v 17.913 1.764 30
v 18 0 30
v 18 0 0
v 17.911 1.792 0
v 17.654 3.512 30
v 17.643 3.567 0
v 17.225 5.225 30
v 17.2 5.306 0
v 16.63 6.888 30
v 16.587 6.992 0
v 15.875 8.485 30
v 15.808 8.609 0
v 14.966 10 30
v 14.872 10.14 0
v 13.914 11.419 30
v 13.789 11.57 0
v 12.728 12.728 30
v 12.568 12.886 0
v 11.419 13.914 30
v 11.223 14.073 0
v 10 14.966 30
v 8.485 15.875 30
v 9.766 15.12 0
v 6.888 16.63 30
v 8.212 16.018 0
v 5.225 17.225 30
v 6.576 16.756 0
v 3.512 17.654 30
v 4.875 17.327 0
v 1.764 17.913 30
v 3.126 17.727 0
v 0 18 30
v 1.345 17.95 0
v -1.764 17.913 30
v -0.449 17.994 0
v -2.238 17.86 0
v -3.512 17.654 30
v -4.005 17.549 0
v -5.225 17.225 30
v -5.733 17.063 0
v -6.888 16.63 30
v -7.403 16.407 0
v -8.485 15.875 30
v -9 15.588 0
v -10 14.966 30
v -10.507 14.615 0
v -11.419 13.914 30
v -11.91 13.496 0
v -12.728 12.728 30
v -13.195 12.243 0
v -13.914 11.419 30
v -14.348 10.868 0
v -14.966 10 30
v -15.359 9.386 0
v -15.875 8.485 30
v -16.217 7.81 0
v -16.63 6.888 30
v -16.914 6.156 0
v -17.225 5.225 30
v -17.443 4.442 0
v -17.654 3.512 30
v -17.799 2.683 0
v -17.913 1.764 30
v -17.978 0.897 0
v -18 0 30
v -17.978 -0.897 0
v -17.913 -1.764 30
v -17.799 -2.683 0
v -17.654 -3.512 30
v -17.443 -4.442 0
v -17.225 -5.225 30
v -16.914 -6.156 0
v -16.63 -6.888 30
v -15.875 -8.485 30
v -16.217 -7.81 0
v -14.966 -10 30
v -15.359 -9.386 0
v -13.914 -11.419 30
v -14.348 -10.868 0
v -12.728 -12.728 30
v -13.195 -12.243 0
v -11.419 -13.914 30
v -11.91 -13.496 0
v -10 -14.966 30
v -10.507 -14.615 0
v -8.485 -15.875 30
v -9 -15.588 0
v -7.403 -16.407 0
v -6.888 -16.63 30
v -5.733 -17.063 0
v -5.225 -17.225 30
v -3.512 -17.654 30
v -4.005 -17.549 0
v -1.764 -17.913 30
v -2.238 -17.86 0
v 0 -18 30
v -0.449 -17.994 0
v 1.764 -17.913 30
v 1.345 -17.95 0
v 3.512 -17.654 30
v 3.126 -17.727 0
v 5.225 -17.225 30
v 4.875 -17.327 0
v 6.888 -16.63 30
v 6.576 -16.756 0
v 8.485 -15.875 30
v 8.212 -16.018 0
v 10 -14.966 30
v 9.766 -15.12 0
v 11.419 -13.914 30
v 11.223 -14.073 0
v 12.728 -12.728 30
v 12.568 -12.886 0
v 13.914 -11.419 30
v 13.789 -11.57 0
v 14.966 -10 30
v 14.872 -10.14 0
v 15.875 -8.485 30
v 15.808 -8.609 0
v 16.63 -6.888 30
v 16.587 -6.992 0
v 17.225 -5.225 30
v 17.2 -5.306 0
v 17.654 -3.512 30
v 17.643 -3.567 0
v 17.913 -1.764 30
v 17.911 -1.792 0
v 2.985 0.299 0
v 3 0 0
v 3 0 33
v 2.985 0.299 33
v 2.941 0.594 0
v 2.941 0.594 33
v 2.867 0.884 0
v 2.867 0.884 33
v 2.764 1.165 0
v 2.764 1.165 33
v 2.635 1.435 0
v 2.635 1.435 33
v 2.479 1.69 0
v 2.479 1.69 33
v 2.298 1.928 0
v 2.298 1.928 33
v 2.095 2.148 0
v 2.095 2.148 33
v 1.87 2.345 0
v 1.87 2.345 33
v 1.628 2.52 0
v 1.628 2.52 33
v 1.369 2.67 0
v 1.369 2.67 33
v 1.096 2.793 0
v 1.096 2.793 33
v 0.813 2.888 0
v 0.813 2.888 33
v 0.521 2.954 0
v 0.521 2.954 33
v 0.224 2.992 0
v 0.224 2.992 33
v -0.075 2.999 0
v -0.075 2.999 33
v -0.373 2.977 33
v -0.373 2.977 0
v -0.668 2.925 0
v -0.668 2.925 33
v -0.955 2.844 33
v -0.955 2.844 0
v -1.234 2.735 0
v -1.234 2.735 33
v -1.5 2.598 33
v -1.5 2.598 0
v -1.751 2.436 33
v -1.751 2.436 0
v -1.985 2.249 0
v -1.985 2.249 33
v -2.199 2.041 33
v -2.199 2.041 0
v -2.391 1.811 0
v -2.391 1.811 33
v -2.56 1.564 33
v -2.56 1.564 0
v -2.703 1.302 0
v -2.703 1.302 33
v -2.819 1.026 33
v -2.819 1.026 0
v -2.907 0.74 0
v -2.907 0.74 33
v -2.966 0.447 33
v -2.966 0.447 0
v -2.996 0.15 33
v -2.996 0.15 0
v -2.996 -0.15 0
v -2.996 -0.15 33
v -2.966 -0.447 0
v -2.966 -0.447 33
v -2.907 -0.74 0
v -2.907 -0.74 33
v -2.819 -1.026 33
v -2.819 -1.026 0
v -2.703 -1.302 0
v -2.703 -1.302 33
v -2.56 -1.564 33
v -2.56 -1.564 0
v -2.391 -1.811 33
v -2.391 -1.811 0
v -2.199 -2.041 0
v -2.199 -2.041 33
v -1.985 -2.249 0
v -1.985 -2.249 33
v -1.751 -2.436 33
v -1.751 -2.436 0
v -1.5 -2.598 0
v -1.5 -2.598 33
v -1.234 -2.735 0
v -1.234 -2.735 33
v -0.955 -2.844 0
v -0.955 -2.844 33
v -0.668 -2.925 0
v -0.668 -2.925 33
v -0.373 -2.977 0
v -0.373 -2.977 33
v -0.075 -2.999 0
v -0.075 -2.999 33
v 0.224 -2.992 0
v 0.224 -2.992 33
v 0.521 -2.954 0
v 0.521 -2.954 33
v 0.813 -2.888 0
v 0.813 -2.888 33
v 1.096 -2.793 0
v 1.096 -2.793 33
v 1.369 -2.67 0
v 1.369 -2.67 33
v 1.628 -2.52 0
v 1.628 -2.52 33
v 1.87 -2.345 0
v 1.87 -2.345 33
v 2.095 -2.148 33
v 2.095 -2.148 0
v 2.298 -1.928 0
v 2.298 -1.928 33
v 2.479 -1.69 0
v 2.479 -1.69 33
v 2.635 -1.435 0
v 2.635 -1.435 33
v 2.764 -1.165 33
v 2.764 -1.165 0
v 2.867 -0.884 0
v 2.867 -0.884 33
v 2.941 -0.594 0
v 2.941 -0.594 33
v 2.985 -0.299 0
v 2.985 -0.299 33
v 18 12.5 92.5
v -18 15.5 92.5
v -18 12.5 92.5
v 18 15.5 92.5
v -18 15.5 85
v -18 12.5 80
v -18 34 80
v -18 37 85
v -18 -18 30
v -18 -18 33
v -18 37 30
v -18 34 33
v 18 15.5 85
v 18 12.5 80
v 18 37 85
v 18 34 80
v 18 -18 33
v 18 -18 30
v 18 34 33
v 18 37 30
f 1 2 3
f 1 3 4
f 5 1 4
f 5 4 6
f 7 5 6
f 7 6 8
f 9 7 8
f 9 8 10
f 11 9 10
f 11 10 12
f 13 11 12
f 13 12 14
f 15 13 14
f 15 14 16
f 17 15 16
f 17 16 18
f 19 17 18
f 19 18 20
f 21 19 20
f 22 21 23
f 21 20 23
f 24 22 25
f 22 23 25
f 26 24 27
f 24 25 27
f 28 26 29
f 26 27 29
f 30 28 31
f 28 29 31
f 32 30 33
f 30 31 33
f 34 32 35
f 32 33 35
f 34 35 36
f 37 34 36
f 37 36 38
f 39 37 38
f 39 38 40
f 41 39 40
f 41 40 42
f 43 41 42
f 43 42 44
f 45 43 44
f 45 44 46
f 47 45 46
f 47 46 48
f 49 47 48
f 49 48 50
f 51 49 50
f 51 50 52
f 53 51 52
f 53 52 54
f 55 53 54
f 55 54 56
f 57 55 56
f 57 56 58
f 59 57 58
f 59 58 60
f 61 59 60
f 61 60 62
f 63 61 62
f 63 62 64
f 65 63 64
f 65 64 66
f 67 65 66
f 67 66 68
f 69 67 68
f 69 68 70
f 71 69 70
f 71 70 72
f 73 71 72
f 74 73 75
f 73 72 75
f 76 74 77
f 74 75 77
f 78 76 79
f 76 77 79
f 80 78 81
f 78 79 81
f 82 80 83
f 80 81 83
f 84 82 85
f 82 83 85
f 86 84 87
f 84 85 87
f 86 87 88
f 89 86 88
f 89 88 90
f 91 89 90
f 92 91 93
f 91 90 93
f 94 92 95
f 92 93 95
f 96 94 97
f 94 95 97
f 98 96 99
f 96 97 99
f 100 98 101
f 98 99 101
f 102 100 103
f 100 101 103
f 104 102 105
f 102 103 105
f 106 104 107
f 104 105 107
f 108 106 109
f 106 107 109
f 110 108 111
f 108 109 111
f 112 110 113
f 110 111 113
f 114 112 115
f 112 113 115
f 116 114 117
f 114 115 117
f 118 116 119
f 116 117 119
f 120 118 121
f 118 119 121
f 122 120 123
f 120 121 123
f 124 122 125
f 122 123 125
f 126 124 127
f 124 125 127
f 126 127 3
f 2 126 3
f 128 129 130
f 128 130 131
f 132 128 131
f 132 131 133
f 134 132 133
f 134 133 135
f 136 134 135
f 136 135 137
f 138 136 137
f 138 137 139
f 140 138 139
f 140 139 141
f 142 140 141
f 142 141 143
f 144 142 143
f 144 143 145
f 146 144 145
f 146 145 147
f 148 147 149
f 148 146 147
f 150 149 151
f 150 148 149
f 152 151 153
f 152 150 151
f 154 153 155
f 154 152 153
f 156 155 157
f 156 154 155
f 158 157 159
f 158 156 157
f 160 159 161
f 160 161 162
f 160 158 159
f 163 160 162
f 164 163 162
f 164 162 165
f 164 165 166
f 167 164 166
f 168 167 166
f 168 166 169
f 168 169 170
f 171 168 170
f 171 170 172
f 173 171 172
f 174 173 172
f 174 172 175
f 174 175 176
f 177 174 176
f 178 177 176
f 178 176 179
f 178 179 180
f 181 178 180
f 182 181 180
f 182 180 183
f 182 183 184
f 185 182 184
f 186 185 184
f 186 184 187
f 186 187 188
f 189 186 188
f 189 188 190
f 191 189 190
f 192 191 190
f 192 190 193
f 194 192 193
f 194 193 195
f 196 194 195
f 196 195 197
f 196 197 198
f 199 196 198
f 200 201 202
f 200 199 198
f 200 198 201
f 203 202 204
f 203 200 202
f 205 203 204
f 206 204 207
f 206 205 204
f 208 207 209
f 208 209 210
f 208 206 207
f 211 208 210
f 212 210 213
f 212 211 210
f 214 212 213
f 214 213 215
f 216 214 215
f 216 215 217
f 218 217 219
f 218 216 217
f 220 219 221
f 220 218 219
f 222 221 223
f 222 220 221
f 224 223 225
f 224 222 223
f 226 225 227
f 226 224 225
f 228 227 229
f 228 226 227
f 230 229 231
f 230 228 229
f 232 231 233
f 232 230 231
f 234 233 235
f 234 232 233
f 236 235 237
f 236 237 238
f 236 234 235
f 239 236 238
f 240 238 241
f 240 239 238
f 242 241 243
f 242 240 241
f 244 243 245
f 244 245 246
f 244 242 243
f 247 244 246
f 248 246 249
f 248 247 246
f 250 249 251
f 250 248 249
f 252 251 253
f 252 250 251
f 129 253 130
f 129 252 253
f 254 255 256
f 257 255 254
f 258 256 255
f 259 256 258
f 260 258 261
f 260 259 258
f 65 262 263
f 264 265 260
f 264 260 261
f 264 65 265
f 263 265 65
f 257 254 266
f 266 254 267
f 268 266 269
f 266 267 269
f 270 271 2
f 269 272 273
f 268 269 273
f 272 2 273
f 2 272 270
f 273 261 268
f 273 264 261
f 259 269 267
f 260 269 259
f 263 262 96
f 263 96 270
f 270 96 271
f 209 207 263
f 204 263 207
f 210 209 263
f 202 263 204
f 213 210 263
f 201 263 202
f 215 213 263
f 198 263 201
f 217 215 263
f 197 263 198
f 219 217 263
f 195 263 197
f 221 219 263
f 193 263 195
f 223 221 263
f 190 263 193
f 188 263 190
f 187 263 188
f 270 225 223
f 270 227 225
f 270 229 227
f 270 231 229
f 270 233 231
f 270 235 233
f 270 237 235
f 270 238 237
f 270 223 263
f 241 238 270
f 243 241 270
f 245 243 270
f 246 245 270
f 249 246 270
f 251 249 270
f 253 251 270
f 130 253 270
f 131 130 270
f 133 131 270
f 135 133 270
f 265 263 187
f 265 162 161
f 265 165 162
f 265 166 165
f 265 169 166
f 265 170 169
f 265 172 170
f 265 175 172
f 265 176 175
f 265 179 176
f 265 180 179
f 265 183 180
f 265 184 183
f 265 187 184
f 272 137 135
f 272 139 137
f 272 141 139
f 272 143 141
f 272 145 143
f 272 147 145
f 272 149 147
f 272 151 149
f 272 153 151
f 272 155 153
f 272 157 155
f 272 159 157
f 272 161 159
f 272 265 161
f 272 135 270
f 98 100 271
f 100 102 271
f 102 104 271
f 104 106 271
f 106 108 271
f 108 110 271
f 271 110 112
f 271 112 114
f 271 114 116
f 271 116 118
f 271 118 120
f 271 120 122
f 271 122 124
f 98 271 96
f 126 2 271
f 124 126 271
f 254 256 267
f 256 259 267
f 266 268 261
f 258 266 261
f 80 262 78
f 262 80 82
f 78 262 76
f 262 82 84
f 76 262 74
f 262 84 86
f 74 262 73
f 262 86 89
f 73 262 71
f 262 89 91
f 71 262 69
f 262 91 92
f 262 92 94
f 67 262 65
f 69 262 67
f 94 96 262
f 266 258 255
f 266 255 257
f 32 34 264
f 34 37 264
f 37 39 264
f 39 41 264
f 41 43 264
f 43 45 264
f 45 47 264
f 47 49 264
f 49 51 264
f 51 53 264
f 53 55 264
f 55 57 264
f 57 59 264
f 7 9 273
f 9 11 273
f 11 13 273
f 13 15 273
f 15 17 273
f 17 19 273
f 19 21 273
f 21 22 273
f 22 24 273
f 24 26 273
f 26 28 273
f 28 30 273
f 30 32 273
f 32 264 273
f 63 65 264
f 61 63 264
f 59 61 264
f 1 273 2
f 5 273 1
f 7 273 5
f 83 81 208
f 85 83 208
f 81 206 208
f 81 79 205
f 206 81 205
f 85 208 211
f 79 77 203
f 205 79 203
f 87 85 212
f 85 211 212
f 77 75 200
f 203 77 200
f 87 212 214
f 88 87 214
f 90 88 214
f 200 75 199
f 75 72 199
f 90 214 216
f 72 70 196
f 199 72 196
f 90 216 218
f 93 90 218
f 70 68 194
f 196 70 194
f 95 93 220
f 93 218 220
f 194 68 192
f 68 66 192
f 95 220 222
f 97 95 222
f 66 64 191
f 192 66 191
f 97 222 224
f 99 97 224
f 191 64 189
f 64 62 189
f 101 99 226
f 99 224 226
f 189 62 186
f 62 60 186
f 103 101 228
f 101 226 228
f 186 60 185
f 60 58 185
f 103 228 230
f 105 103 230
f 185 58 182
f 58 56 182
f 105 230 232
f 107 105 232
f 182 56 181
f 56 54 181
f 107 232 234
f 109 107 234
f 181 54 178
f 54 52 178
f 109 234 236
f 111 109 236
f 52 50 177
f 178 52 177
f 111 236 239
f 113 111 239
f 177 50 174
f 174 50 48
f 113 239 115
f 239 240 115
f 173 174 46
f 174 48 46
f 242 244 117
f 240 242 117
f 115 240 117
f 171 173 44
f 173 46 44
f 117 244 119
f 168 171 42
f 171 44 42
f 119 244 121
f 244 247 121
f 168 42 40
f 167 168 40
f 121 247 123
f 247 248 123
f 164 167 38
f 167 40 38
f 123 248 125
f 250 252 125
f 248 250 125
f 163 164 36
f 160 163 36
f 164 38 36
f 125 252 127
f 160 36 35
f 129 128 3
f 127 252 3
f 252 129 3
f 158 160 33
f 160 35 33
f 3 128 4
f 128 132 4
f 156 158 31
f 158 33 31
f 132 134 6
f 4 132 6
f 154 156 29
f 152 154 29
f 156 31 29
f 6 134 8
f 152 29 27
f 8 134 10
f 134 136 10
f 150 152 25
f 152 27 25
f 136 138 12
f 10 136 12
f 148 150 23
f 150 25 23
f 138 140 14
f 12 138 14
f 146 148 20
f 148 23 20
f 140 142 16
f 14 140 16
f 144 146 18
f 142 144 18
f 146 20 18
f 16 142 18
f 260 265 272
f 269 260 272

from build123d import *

# Parameters (mm, degrees)
SKETCH2_R               = 18
BOSS_EXTRUDE1_DEPTH     = 30
SKETCH4_W               = 36
SKETCH4_H               = 55
BOSS_EXTRUDE2_DEPTH     = 3
CUT_EXTRUDE1_DEPTH      = 3
CUT_EXTRUDE1_DEPTH_BACK = 60
SKETCH3_R               = 3
SKETCH6_W               = 36
SKETCH6_H               = 47
BOSS_EXTRUDE3_DEPTH     = 3
BOSS_EXTRUDE4_DEPTH     = 5
SKETCH8_W               = 36
SKETCH8_H               = 3
BOSS_EXTRUDE5_DEPTH     = 7.5


with BuildPart() as part:
    # Sketch2 → Boss-Extrude1 (new body)
    with BuildSketch(Plane.XY):
        Circle(SKETCH2_R)
    extrude(amount=BOSS_EXTRUDE1_DEPTH)

    # Sketch4 → Boss-Extrude2 (add)
    with BuildSketch(Plane.XY.offset(30)):
        with Locations((0, 9.5)):
            Rectangle(SKETCH4_W, SKETCH4_H)
    extrude(amount=BOSS_EXTRUDE2_DEPTH)

    # Sketch3 → Cut-Extrude1 (cut, two sides: drawn at the far end of the back side and taken through both)
    with BuildSketch(Plane.XY.offset(30).offset(-CUT_EXTRUDE1_DEPTH_BACK)):
        Circle(SKETCH3_R)
    extrude(amount=CUT_EXTRUDE1_DEPTH + CUT_EXTRUDE1_DEPTH_BACK, mode=Mode.SUBTRACT)

    # Sketch6 → Boss-Extrude3 (add)
    with BuildSketch(Plane(origin=(0, 37, 0), x_dir=(1, 0, 0), z_dir=(0, 1, 0))):
        with Locations((0, -56.5)):
            Rectangle(SKETCH6_W, SKETCH6_H)
    extrude(amount=-BOSS_EXTRUDE3_DEPTH)

    # Sketch7 → Boss-Extrude4 (add)
    with BuildSketch(Plane.XY.offset(80)):
        Polygon((18, 34), (18, 12.5), (-18, 12.5), (-18, 34), (-18, 37), (18, 37), align=None)
    extrude(amount=BOSS_EXTRUDE4_DEPTH)

    # Sketch8 → Boss-Extrude5 (add)
    with BuildSketch(Plane.XY.offset(85)):
        with Locations((0, 14)):
            Rectangle(SKETCH8_W, SKETCH8_H)
    extrude(amount=BOSS_EXTRUDE5_DEPTH)


solid = part.part
